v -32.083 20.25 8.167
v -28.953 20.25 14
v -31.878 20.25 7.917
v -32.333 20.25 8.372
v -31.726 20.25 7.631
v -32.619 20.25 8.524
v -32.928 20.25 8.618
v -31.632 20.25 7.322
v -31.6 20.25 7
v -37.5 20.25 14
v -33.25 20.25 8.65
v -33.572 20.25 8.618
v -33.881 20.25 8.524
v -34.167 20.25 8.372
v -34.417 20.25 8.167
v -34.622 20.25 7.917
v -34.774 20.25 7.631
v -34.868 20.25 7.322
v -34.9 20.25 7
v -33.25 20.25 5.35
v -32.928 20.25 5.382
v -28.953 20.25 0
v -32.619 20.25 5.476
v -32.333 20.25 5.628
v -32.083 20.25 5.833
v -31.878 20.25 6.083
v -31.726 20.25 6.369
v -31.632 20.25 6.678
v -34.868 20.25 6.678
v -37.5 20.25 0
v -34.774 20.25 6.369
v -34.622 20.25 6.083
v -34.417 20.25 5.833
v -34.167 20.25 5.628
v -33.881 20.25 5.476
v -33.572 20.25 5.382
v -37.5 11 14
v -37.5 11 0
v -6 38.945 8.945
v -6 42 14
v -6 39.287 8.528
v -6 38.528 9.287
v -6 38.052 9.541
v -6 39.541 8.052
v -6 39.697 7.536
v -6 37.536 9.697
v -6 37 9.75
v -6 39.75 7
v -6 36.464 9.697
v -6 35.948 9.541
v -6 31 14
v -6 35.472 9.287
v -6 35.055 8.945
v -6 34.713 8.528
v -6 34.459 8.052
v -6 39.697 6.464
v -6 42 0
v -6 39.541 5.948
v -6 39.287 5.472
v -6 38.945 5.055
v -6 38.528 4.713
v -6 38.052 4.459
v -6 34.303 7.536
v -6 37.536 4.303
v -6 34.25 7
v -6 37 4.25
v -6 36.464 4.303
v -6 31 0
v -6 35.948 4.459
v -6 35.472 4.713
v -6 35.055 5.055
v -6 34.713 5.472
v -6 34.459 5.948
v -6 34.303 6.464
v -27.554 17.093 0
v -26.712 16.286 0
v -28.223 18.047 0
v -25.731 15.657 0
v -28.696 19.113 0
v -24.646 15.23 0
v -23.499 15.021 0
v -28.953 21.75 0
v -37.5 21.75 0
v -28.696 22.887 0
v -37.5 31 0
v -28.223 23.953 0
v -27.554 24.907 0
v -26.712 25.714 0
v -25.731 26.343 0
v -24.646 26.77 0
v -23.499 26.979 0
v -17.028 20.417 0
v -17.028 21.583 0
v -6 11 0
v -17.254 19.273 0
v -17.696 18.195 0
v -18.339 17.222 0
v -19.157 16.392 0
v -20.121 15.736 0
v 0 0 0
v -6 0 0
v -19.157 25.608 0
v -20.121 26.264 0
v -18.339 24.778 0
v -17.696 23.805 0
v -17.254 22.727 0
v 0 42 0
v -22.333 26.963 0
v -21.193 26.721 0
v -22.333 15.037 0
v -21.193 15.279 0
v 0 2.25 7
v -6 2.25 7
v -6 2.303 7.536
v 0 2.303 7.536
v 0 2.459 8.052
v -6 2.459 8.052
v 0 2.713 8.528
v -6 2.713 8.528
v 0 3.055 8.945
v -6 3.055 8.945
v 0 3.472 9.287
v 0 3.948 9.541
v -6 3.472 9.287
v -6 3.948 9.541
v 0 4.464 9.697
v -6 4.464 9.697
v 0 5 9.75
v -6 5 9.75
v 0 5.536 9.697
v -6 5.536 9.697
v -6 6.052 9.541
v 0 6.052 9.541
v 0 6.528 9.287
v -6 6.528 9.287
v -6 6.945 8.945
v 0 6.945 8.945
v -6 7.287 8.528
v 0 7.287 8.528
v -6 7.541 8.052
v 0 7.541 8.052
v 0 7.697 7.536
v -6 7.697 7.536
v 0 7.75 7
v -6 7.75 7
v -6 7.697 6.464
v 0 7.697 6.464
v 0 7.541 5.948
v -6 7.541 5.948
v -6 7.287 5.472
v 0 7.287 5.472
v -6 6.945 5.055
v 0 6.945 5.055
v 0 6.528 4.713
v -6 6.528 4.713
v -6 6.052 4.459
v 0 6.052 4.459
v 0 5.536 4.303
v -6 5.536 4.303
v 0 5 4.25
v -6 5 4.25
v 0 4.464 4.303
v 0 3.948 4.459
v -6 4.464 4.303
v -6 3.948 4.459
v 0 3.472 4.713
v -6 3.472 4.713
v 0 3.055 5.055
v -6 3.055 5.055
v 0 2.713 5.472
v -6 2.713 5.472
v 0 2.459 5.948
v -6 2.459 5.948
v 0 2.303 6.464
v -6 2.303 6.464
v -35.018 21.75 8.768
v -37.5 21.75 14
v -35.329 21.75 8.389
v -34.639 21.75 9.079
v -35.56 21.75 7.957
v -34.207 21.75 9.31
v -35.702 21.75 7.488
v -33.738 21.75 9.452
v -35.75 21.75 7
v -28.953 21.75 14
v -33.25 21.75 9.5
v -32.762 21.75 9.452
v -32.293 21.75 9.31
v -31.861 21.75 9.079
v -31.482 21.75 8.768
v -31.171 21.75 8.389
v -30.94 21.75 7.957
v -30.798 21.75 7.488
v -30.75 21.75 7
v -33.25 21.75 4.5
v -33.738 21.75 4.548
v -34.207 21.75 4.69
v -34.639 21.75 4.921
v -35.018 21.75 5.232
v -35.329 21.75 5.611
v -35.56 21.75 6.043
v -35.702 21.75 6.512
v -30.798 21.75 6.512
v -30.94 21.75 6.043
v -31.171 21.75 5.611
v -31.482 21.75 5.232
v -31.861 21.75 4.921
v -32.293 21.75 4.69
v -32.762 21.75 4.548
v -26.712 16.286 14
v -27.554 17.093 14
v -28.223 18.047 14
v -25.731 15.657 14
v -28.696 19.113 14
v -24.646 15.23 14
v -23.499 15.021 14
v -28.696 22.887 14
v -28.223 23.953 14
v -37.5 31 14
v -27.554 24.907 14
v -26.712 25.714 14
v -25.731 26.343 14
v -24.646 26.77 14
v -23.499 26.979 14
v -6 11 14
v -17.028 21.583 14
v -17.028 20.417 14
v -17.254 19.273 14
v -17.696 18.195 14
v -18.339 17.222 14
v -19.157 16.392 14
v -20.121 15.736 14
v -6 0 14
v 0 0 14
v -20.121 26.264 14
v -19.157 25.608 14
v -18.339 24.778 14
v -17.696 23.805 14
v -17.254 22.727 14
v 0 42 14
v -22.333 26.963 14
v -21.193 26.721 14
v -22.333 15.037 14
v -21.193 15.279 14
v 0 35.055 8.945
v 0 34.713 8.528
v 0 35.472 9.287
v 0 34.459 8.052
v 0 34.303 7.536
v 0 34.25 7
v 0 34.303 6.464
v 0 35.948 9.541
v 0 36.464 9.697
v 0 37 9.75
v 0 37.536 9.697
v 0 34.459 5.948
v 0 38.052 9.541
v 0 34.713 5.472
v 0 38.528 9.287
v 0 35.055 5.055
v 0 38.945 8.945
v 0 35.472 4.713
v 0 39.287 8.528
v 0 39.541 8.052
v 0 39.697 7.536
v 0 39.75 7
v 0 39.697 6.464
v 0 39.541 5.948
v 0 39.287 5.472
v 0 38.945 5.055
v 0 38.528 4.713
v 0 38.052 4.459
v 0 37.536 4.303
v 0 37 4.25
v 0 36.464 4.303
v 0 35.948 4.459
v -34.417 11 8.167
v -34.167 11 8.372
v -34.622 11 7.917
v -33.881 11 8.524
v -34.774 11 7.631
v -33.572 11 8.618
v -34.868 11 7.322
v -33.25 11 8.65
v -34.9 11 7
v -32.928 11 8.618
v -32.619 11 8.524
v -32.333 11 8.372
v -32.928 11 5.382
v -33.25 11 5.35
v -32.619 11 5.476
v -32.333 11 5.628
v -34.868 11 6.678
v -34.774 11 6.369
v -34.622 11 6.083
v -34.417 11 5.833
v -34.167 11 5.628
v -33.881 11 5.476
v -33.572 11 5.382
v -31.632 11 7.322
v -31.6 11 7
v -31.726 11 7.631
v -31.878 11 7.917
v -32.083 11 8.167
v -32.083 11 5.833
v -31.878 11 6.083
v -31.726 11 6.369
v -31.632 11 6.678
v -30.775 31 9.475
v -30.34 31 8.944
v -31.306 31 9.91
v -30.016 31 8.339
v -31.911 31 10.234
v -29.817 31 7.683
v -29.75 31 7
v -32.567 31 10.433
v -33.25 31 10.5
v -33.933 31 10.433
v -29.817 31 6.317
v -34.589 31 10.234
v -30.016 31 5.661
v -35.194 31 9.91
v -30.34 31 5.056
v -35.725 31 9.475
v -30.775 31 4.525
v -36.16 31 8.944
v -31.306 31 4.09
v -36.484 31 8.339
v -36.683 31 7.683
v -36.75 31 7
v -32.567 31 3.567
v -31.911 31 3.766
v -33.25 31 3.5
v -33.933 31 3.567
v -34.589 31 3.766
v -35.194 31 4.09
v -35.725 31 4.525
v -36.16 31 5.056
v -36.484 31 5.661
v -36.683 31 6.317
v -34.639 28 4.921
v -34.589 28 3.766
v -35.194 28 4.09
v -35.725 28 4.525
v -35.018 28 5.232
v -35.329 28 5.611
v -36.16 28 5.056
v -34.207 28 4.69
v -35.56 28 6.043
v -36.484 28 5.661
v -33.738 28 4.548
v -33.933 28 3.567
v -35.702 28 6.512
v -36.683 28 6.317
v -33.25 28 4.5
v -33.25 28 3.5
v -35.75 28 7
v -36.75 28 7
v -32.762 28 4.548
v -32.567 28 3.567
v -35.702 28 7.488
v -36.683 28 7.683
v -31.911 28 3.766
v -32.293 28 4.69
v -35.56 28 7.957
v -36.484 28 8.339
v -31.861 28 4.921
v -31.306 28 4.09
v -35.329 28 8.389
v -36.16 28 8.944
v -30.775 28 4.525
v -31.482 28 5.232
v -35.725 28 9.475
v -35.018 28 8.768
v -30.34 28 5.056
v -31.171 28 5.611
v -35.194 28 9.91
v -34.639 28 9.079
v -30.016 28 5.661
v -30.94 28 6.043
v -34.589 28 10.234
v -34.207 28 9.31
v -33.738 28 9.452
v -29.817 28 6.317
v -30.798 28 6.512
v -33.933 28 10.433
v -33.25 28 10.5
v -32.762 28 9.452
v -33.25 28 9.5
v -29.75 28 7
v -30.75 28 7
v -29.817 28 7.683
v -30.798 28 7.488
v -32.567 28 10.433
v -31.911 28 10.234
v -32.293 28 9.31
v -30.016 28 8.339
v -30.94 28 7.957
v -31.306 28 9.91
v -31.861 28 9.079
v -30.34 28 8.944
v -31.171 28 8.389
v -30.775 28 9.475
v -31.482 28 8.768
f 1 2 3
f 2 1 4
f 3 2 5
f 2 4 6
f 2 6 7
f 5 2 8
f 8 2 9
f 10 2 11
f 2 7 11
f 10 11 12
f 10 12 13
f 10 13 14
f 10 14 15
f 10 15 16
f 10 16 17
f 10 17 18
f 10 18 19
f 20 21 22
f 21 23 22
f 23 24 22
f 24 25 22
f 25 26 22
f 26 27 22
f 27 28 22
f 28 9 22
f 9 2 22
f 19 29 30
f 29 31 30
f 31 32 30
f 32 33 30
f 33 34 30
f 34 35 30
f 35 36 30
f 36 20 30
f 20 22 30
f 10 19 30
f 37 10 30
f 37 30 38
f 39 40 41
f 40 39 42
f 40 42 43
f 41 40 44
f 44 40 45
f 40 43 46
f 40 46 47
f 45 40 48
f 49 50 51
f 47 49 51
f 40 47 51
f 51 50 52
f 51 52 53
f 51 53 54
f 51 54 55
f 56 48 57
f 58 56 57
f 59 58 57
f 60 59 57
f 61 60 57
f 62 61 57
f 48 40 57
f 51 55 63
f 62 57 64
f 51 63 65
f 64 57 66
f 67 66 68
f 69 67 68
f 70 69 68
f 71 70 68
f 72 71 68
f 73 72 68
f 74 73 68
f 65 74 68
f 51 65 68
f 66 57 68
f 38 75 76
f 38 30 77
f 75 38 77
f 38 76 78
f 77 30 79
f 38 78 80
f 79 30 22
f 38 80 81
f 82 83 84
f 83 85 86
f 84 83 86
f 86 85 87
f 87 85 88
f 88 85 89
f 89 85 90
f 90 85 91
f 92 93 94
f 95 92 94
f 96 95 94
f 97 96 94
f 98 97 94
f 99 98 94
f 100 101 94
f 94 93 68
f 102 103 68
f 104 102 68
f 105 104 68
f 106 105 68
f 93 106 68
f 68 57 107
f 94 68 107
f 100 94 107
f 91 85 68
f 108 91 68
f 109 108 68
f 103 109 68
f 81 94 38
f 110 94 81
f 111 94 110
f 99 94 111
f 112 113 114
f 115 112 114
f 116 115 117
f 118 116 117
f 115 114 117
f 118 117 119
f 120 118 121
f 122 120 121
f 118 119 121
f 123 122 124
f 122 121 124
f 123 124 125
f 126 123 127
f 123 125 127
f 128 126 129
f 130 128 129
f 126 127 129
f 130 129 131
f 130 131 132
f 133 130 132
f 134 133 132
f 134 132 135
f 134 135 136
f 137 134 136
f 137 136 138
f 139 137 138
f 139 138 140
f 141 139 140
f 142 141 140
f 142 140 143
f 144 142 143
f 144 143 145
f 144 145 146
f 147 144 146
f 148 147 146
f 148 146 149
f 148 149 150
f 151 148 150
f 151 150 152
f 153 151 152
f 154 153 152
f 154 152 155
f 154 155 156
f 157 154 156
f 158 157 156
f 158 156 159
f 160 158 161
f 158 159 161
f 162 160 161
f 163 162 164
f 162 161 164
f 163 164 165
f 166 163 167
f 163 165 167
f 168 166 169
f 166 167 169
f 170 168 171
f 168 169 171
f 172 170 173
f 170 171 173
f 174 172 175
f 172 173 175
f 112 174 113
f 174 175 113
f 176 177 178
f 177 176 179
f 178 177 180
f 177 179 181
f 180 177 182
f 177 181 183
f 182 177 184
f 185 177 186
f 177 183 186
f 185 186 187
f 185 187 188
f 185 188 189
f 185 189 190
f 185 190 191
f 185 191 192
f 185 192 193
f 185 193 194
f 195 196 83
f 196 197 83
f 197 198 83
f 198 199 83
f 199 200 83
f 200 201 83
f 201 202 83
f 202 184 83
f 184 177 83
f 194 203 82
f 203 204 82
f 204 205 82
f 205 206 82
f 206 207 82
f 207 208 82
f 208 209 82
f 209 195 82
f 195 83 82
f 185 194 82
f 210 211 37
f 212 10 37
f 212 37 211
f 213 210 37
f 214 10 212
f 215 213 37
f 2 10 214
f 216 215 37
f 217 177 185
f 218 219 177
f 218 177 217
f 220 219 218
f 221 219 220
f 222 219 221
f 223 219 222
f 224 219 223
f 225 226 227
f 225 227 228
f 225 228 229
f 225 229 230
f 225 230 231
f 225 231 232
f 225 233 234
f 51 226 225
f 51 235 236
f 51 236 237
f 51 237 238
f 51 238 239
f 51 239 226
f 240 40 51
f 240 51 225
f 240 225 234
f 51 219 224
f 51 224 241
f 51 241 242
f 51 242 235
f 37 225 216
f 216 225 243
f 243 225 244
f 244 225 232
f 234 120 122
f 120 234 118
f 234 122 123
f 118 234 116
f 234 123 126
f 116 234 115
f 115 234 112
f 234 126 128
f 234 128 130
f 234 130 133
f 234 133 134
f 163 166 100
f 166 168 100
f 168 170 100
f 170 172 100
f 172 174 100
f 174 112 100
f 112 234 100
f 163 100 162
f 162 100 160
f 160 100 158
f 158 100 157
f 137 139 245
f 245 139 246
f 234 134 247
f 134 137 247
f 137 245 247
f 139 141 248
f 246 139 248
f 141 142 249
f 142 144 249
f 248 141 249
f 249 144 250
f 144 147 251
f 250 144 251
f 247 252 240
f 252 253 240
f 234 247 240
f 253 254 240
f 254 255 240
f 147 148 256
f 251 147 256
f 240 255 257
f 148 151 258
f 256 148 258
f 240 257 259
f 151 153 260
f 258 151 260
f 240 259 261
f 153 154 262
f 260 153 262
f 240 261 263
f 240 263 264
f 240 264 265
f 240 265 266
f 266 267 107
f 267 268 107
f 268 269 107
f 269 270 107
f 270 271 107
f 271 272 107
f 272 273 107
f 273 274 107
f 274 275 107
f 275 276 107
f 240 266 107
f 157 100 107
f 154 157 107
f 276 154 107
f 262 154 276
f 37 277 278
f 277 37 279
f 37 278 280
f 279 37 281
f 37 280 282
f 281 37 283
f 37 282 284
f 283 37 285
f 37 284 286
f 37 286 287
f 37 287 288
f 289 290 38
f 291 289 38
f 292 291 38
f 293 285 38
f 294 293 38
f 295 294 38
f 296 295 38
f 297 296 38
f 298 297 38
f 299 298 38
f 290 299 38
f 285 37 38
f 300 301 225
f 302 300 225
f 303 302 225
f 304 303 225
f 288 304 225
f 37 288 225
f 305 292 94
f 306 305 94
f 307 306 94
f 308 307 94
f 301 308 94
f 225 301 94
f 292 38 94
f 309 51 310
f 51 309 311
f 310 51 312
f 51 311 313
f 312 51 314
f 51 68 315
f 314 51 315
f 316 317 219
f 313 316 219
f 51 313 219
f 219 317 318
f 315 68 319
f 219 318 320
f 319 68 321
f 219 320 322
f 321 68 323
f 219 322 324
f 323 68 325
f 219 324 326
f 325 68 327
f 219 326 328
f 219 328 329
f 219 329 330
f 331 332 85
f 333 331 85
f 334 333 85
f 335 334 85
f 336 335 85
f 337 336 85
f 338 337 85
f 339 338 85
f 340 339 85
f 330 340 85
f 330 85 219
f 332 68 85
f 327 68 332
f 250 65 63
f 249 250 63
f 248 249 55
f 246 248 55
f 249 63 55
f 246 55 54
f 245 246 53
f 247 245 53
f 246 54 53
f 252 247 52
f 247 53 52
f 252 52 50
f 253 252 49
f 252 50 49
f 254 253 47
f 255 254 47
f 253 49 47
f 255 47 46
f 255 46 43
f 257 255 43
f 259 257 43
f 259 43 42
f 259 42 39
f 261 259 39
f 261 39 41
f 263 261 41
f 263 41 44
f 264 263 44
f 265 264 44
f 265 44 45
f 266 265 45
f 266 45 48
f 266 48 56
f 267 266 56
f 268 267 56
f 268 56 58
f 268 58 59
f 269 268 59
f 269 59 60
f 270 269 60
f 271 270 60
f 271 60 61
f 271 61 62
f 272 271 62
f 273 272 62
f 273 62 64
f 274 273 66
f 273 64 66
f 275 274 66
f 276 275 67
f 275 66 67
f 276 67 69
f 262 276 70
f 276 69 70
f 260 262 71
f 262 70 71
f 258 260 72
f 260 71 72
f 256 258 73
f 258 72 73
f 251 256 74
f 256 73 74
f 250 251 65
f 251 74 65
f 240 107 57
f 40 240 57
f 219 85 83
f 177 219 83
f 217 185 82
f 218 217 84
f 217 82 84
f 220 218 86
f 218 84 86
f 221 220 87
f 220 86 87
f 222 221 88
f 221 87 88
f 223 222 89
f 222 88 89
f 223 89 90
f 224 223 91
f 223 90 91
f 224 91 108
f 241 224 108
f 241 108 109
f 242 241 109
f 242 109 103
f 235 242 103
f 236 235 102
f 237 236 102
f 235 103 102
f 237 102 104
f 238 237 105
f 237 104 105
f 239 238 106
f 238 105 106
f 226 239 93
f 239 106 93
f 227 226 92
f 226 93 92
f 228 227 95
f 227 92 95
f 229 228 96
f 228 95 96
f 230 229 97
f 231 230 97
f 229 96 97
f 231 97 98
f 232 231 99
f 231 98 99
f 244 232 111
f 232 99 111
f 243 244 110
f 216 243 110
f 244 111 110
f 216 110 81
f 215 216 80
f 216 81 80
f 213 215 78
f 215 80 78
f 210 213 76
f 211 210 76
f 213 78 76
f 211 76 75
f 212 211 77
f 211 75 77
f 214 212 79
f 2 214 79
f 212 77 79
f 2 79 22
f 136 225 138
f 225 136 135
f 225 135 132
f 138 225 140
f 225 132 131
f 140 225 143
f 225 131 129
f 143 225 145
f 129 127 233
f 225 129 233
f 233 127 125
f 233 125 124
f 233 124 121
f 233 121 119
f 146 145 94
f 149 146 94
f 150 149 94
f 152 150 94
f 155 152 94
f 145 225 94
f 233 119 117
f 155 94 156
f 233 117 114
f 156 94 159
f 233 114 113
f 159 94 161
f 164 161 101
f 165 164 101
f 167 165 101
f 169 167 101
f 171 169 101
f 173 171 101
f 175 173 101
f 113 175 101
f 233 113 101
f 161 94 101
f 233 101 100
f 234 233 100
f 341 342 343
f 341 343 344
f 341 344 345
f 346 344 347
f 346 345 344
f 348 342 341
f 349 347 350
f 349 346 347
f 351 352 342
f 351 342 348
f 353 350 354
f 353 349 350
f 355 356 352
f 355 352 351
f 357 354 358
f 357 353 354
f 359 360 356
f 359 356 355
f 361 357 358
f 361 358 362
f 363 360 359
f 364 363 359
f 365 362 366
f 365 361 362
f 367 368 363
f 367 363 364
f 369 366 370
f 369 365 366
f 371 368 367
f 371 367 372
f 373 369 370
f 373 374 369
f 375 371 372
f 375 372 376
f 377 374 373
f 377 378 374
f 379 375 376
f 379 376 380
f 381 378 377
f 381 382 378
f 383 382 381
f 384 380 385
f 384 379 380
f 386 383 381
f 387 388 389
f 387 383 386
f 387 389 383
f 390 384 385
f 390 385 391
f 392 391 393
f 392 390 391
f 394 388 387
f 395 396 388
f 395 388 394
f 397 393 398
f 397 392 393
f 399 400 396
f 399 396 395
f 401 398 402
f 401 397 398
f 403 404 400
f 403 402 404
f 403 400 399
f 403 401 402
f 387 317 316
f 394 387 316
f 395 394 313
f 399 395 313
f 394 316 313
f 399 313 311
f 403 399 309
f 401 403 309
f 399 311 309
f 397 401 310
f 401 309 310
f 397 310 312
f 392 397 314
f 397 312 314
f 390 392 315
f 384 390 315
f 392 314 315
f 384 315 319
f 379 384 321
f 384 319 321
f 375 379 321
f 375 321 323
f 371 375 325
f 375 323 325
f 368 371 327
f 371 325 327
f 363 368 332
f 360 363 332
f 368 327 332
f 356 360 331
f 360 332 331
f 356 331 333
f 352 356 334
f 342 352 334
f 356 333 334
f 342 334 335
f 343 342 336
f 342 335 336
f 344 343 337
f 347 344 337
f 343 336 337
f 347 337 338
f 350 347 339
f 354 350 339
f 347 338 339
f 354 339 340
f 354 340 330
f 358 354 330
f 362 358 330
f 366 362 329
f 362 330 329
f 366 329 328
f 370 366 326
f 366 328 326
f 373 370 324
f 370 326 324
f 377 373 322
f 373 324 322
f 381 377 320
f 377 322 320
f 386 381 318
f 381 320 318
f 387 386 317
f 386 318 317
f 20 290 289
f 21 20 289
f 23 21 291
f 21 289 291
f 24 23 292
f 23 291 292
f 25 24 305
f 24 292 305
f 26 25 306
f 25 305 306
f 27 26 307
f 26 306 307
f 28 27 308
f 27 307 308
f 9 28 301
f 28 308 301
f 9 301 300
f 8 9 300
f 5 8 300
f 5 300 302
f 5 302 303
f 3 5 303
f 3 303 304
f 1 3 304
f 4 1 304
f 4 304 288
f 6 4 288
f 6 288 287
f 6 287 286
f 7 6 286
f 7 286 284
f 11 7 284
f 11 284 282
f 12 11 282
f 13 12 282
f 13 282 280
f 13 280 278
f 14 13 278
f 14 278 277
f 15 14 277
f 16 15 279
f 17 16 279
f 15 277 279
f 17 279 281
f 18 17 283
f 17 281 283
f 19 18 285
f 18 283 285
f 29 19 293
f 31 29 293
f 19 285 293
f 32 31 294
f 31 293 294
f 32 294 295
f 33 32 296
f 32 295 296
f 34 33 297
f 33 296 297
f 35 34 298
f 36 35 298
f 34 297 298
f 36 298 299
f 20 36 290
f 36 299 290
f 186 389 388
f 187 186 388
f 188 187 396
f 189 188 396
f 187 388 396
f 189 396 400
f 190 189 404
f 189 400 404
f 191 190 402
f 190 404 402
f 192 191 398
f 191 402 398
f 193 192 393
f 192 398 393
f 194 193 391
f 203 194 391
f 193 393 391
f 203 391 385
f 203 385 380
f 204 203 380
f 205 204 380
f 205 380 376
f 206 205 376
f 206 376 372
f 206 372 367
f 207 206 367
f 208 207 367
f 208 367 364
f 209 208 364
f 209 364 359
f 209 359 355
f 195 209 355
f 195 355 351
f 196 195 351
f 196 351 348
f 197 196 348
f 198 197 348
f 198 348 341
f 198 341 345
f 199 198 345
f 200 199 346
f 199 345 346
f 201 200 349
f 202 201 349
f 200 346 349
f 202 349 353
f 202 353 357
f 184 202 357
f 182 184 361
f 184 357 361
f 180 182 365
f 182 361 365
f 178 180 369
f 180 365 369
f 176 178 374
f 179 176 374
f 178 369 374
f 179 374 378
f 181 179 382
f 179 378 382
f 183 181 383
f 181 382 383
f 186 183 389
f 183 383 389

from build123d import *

# Parameters (mm, degrees)
EXTRUS_O1_DEPTH               = 14
EXTRUS_O2_REACH               = 52.629
ESBO_O2_R                     = 2.5
FURO_ROSCADO_DE_M4X0_71_D     = 3.3
FURO_ROSCADO_DE_M4X0_71_DEPTH = 11.5
FURO_ROSCADO_DE_M4X0_71_TIP   = 0.991420021
ESBO_O5_R                     = 2.75
EXTRUS_O3_DEPTH               = 55.334611437
ESBO_O6_R                     = 3.5
EXTRUS_O4_DEPTH               = 3


with BuildPart() as part:
    # Esboço1 → Extrusão1 (new body)
    with BuildSketch(Plane.XY):
        with BuildLine():
            Line((0, 0), (0, 42))
            Line((0, 42), (-6, 42))
            Line((-6, 42), (-6, 31))
            Line((-6, 31), (-37.5, 31))
            Line((-37.5, 31), (-37.5, 21.75))
            Line((-37.5, 21.75), (-28.95294045, 21.75))
            ThreePointArc((-28.95294045, 21.75), (-17, 21), (-28.95294045, 20.25))
            Line((-28.95294045, 20.25), (-37.5, 20.25))
            Line((-37.5, 20.25), (-37.5, 11))
            Line((-37.5, 11), (-6, 11))
            Line((-6, 11), (-6, 0))
            Line((-6, 0), (0, 0))
        make_face()
    extrude(amount=EXTRUS_O1_DEPTH)

    # Esboço2 → Extrusão2 (cut, up to next)
    with BuildSketch(Plane(origin=(0, 31, 0), x_dir=(1, 0, 0), z_dir=(0, 1, 0)), mode=Mode.PRIVATE) as extrus_o2_sk1:
        with Locations(Location((-33.25, -7, 0), (0, 0, 270))):
            Circle(ESBO_O2_R)
    extrus_o2_tool1 = extrude(extrus_o2_sk1.sketch, amount=-EXTRUS_O2_REACH, mode=Mode.PRIVATE) & part.part
    add(extrus_o2_tool1.solids().sort_by_distance((-33.25, 31, 7))[0], mode=Mode.SUBTRACT)

    # Furo roscado de M4x0.71
    with Locations(Plane(origin=(-33.25, 20.25, 7), x_dir=(0, 0, 1), z_dir=(0, 1, 0))):
        with Locations((0, 0)):
            Hole(FURO_ROSCADO_DE_M4X0_71_D / 2, depth=FURO_ROSCADO_DE_M4X0_71_DEPTH)
            with Locations((0, 0, -(FURO_ROSCADO_DE_M4X0_71_DEPTH + FURO_ROSCADO_DE_M4X0_71_TIP / 2))):  # 118° drill point
                Cone(0, FURO_ROSCADO_DE_M4X0_71_D / 2, FURO_ROSCADO_DE_M4X0_71_TIP, mode=Mode.SUBTRACT)

    # Esboço5 → Extrusão3 (cut, through all)
    with BuildSketch(Plane.ZY.offset(6)):
        with Locations(Location((7, 37, 0), (0, 0, 270))):
            Circle(ESBO_O5_R)
        with Locations(Location((7, 5, 0), (0, 0, 270))):
            Circle(ESBO_O5_R)
    extrude(amount=-EXTRUS_O3_DEPTH, mode=Mode.SUBTRACT)

    # Esboço6 → Extrusão4 (cut)
    with BuildSketch(Plane(origin=(0, 31, 0), x_dir=(1, 0, 0), z_dir=(0, 1, 0))):
        with Locations(Location((-33.25, -7, 0), (0, 0, 270))):
            Circle(ESBO_O6_R)
    extrude(amount=-EXTRUS_O4_DEPTH, mode=Mode.SUBTRACT)


solid = part.part
